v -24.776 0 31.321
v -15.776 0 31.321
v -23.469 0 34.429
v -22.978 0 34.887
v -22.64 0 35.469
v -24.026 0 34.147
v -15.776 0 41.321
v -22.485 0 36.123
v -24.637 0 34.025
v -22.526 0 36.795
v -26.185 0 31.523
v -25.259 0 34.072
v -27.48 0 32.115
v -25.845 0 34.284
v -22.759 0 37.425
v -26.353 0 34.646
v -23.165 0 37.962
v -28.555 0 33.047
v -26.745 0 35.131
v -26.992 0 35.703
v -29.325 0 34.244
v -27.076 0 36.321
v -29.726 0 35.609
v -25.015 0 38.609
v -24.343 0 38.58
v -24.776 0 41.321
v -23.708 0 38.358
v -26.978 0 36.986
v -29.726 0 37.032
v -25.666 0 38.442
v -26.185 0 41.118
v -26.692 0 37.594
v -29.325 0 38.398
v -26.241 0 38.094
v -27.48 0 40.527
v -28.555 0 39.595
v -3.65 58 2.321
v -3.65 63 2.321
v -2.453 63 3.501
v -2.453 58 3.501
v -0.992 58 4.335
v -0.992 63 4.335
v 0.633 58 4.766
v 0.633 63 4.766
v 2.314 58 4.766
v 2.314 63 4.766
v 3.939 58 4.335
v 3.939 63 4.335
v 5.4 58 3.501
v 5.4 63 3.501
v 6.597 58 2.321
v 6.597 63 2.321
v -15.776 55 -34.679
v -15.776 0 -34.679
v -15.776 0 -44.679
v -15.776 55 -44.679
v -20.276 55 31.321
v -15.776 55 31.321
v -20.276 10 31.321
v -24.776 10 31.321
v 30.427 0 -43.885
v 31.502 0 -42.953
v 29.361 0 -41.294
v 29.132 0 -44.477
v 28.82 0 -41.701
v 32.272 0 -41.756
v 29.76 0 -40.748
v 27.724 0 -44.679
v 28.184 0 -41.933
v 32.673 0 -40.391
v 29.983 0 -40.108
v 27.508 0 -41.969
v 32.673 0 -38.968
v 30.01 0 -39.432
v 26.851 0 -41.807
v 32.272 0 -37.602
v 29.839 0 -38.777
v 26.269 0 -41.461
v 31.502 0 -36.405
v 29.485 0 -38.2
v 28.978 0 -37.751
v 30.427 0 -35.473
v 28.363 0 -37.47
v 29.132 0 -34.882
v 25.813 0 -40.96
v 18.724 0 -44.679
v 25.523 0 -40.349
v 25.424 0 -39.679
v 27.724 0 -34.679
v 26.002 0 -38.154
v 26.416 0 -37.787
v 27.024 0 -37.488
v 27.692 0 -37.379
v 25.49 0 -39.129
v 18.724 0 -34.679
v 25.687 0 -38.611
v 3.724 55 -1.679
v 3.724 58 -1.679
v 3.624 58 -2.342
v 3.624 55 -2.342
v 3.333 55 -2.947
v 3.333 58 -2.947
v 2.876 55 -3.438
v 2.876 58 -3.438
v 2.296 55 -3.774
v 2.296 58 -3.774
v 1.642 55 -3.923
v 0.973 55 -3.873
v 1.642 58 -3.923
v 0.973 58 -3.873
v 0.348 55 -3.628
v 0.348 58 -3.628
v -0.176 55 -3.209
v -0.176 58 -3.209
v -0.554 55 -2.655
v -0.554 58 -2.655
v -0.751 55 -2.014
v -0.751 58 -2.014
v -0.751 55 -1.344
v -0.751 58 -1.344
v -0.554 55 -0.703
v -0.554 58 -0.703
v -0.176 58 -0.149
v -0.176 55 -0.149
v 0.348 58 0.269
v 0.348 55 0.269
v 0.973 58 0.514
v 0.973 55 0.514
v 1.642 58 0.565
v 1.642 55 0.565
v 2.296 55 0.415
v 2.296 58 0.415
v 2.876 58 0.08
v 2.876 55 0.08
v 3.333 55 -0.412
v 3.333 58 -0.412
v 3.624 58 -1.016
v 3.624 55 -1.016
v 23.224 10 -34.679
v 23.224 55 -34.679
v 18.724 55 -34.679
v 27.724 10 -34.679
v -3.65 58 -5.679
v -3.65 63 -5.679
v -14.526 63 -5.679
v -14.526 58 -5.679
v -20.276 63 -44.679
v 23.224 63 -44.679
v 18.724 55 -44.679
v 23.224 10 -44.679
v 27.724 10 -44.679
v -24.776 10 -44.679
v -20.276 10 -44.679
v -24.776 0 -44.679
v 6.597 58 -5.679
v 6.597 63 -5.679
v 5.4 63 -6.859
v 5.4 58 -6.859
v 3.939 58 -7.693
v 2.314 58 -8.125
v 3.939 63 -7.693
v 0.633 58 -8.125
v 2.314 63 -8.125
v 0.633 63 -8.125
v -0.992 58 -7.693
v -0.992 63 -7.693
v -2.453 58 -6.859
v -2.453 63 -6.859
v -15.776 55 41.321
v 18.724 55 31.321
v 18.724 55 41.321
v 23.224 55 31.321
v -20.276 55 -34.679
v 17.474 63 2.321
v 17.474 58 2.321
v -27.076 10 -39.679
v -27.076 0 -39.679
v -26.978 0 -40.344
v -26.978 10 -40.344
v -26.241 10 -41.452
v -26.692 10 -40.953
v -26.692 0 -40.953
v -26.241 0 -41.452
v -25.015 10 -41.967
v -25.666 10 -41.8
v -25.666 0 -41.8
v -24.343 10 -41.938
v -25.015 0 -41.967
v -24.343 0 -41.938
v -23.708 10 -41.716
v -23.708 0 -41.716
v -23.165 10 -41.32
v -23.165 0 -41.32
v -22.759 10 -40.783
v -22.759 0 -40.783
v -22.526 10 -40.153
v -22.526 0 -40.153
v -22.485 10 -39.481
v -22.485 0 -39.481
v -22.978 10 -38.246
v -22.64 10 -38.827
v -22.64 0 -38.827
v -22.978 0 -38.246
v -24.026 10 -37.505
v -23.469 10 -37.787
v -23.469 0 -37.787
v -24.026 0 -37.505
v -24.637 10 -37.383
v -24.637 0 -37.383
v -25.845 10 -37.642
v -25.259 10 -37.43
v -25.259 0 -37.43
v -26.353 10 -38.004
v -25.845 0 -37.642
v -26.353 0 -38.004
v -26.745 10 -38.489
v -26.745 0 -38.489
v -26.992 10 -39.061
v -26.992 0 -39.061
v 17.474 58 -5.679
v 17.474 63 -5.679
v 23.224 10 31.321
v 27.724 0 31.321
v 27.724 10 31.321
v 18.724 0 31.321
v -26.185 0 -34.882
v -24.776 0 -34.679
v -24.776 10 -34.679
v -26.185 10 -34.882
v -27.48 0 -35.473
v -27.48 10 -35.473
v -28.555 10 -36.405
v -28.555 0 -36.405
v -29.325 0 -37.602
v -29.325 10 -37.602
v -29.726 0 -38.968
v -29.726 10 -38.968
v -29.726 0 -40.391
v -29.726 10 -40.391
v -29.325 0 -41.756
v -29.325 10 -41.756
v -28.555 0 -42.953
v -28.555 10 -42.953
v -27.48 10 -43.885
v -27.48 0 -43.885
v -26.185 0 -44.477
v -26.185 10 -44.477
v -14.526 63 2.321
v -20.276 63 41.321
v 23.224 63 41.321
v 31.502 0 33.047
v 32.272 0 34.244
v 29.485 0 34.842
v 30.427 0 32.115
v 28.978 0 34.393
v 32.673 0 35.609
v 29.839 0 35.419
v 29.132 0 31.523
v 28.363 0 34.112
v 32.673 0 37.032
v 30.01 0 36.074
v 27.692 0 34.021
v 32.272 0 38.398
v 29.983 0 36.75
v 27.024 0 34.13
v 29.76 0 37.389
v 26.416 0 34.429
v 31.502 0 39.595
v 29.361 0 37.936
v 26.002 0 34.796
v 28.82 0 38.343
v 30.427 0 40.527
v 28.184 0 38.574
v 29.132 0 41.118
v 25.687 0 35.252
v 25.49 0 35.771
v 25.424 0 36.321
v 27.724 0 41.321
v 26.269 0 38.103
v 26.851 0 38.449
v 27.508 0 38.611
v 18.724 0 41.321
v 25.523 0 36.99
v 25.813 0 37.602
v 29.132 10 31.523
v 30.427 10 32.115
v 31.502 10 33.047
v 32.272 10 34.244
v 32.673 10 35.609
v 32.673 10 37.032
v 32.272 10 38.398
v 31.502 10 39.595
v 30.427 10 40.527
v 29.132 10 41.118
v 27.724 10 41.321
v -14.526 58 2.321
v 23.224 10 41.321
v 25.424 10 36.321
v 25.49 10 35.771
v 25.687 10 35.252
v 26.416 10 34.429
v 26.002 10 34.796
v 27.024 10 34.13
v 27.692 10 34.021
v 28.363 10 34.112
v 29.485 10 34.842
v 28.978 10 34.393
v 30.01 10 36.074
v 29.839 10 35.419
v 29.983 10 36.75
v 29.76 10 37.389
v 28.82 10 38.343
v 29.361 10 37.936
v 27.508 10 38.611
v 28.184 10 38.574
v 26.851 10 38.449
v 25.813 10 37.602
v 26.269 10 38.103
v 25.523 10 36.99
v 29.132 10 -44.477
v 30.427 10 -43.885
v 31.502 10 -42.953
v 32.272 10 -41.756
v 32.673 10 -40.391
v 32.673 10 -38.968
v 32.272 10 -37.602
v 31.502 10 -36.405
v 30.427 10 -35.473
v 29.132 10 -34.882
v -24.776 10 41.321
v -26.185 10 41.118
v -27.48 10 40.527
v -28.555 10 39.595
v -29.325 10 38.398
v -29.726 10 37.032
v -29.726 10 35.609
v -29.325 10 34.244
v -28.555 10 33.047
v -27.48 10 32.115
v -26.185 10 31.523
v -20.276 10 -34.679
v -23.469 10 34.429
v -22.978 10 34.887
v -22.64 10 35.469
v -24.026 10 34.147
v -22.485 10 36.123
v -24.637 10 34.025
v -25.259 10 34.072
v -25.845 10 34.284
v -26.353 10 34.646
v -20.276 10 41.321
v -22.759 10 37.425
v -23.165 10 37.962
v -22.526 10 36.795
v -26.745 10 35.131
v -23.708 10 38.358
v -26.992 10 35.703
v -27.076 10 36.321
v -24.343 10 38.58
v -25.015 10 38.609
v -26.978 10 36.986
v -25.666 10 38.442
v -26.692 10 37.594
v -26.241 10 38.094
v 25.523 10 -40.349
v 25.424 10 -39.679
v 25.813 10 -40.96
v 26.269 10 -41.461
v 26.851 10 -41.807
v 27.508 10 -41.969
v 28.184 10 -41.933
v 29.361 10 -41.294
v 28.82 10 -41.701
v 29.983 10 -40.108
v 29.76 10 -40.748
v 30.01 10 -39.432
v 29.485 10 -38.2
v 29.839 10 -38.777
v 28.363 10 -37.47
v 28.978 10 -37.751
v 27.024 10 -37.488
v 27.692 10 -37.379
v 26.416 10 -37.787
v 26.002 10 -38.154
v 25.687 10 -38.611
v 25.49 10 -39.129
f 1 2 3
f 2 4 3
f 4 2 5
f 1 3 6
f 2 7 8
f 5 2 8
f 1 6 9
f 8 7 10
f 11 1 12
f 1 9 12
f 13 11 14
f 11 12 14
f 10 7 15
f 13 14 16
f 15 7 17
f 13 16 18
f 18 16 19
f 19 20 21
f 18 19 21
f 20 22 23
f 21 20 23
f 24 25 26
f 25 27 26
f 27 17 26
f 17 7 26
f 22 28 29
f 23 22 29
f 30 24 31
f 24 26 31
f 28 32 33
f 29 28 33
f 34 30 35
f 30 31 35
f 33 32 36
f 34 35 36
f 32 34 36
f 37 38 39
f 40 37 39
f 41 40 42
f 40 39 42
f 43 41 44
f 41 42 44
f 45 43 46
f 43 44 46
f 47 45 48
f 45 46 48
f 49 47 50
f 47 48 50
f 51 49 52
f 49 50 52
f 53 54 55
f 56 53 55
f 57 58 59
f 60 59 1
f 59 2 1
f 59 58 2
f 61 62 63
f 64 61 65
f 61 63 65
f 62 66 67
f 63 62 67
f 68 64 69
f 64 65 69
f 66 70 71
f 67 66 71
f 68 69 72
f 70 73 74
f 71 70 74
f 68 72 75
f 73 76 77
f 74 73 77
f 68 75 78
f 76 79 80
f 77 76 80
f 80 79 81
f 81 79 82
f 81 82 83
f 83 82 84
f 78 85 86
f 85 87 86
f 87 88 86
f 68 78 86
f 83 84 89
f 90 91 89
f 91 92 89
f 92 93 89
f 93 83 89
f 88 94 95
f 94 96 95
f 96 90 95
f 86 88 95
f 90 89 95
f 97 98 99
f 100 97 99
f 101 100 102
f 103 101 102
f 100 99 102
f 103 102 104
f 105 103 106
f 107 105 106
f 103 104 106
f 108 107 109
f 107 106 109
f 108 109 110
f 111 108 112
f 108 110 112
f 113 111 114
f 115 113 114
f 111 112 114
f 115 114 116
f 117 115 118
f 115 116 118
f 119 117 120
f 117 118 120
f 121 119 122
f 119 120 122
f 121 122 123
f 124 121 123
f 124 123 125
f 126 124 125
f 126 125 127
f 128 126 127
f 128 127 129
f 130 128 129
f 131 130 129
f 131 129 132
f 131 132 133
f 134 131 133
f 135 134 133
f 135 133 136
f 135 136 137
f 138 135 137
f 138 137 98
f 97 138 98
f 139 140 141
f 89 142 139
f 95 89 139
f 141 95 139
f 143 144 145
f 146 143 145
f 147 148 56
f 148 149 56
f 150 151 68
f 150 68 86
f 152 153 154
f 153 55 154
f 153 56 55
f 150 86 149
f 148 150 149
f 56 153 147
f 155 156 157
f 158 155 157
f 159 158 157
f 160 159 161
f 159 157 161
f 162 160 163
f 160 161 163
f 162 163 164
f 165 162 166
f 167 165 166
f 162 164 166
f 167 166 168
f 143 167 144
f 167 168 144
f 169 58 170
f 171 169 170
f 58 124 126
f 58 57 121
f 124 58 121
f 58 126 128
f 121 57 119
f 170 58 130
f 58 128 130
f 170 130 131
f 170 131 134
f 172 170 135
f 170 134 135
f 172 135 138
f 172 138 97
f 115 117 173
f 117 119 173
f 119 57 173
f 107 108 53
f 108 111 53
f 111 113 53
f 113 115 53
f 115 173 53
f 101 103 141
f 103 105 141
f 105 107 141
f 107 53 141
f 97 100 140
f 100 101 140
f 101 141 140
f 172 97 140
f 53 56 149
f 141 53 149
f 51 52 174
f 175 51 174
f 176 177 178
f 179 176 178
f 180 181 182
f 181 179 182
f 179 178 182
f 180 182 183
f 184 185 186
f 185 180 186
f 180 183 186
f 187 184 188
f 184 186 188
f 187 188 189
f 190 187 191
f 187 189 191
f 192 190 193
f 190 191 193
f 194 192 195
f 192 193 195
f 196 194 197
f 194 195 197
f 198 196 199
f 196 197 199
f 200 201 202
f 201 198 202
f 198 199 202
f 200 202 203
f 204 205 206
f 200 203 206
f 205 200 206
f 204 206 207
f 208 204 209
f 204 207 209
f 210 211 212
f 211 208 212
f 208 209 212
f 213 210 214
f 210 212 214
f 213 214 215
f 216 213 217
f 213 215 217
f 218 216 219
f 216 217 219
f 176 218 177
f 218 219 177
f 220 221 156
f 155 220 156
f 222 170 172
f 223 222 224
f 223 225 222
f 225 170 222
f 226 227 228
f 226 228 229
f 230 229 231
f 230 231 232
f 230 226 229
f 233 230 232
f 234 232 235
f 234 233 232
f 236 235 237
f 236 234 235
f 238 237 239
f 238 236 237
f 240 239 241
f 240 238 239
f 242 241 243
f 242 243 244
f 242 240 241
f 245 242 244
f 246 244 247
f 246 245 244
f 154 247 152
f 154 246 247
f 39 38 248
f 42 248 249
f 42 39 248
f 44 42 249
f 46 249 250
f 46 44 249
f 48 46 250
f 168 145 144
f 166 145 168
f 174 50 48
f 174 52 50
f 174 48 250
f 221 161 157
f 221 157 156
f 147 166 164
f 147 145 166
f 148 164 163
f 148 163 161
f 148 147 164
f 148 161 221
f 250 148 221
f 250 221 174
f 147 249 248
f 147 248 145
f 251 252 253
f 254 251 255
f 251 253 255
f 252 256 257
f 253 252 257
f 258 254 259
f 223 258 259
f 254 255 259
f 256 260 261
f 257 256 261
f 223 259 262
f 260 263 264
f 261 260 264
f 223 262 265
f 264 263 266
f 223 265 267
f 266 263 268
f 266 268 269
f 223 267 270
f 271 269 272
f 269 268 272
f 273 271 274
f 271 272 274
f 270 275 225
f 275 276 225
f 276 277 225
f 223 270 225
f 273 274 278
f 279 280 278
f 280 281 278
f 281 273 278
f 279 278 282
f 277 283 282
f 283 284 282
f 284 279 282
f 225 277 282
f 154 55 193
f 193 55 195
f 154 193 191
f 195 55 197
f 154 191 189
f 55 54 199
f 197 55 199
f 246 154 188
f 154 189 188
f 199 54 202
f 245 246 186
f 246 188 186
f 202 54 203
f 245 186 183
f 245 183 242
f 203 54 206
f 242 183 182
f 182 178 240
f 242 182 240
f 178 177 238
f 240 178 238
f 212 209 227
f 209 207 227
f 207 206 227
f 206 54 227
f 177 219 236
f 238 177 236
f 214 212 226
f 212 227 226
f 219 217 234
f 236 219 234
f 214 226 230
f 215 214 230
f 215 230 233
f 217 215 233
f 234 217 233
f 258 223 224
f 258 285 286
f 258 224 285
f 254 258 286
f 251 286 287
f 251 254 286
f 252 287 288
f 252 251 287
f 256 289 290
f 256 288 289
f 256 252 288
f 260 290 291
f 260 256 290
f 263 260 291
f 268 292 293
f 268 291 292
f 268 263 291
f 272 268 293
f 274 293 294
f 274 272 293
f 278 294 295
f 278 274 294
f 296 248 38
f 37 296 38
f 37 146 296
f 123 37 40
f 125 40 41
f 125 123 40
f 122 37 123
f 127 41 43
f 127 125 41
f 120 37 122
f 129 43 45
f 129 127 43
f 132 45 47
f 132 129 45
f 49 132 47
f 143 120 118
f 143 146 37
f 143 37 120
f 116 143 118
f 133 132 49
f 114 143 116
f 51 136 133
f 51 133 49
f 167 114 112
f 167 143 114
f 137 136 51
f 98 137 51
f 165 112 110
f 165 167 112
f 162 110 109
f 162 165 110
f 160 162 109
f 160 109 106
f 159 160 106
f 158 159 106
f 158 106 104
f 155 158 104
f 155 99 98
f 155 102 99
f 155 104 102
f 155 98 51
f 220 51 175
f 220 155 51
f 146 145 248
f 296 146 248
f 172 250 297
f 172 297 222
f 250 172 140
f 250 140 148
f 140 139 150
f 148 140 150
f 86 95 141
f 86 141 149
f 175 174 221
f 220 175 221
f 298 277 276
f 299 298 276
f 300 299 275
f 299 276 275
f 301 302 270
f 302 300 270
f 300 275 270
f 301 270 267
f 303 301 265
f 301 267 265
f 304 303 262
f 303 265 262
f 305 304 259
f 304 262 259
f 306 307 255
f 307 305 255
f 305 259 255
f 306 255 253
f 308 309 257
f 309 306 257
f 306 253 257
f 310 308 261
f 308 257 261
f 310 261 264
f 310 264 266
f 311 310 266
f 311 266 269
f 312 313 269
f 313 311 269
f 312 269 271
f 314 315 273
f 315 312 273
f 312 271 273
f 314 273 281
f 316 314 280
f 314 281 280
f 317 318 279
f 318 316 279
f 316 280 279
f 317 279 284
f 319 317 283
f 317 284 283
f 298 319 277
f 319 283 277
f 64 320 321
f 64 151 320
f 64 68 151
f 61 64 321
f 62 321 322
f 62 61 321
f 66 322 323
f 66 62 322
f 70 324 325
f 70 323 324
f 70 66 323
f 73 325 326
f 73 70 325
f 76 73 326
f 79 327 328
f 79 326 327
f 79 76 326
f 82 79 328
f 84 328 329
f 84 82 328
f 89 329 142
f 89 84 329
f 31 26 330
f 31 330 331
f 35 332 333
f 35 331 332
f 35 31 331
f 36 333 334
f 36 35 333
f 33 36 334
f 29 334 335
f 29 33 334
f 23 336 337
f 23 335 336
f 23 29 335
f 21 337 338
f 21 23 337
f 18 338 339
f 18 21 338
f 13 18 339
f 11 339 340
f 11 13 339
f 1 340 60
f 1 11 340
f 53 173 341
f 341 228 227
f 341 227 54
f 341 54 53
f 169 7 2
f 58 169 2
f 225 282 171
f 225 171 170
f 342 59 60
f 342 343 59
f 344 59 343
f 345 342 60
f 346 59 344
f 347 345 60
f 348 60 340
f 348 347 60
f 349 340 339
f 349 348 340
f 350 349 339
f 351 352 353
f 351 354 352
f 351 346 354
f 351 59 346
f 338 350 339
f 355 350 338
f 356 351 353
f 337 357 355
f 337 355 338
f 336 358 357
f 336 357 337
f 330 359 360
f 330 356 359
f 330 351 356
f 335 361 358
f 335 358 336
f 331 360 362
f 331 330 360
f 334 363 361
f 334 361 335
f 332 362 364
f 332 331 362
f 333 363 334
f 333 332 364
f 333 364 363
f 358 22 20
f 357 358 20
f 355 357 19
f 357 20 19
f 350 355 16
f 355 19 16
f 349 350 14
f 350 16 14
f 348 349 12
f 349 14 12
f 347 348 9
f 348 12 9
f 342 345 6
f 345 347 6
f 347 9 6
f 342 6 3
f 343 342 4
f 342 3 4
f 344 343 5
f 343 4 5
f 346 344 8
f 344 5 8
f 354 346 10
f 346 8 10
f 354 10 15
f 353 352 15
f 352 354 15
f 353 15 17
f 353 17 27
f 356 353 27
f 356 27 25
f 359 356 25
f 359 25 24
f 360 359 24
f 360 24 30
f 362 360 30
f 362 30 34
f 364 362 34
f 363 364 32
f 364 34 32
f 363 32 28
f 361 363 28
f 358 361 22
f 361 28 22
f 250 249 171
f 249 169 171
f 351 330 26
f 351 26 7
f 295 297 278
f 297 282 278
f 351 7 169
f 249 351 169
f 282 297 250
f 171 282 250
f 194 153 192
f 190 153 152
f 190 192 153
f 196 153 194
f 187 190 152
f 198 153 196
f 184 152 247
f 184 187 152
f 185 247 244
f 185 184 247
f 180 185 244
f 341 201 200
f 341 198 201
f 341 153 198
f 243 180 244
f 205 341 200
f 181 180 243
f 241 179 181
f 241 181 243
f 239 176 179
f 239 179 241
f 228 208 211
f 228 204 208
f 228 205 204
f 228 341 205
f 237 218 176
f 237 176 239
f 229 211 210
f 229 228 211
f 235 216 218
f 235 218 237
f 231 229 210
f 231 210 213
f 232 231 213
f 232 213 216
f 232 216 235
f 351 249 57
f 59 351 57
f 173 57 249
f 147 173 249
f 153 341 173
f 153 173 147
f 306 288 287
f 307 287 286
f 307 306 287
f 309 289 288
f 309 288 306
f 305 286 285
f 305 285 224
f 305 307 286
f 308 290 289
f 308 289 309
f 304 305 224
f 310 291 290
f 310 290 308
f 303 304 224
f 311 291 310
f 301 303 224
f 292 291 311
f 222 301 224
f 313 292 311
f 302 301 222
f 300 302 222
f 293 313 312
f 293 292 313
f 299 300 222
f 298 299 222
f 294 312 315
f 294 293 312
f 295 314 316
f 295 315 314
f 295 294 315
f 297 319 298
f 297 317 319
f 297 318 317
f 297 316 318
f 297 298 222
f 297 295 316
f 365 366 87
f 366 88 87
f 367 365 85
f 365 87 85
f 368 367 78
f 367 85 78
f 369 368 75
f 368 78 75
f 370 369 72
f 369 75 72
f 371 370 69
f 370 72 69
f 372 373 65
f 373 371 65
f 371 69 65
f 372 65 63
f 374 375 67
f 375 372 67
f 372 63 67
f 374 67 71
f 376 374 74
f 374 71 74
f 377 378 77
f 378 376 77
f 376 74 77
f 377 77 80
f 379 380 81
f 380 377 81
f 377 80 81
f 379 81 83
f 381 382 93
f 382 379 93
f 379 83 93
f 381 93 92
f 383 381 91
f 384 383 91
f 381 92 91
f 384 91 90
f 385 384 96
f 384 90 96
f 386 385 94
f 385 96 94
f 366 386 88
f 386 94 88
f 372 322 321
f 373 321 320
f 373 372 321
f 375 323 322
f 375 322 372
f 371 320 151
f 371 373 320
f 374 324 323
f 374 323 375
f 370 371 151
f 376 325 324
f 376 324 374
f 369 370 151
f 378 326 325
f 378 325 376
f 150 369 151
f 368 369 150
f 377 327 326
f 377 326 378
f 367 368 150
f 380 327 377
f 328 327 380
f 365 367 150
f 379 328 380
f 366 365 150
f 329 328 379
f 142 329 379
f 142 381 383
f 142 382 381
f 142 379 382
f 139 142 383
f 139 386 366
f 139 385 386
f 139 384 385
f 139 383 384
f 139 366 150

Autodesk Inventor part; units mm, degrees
ref_plane "YZ Plane" through (0, 0, 0) normal (1, 0, 0) x (0, 1, 0)
ref_plane "XZ Plane" through (0, 0, 0) normal (0, 1, 0) x (-1, 0, 0)
ref_plane "XY Plane" through (0, 0, 0) normal (0, 0, 1) x (1, 0, 0)
sketch "Sketch1" plane through (0, 0, 0) normal (0, 1, 0) x (-1, 0, 0)
  circle A0 centre (-27.7235, -39.6791) radius 2.3
  line L0 (24.7765, 36.3209) -> (-27.7235, -39.6791)
  circle A1 centre (24.7765, -39.6791) radius 2.3
  circle A2 centre (-27.7235, 36.3209) radius 2.3
  line L1 (24.7765, -39.6791) -> (-27.7235, 36.3209)
  circle A3 centre (24.7765, 36.3209) radius 2.3
  circle A4 centre (24.7765, 36.3209) radius 2.3
  circle A5 centre (-27.7235, 36.3209) radius 2.3
  circle A6 centre (24.7765, -39.6791) radius 2.3
  circle A7 centre (-27.7235, -39.6791) radius 2.3
  circle A8 centre (-1.4735, -1.6791) radius 6.8323
  circle A9 centre (-27.7235, 36.3209) radius 5
  circle A10 centre (-27.7235, -39.6791) radius 5
  circle A11 centre (24.7765, -39.6791) radius 5
  circle A12 centre (24.7765, 36.3209) radius 5
  line L2 (-27.7235, 41.3209) -> (-18.7235, 41.3209)
  line L3 (-18.7235, 41.3209) -> (-18.7235, 31.3209)
  line L4 (-18.7235, 31.3209) -> (-27.7235, 31.3209)
  line L5 (24.7765, 41.3209) -> (15.7765, 41.3209)
  line L6 (15.7765, 41.3209) -> (15.7765, 31.3209)
  line L7 (15.7765, 31.3209) -> (24.7765, 31.3209)
  line L8 (24.7765, -34.6791) -> (15.7765, -34.6791)
  line L9 (15.7765, -34.6791) -> (15.7765, -44.6791)
  line L10 (15.7765, -44.6791) -> (24.7765, -44.6791)
  line L11 (-27.7235, -34.6791) -> (-18.7235, -34.6791)
  line L12 (-18.7235, -34.6791) -> (-18.7235, -44.6791)
  line L13 (-18.7235, -44.6791) -> (-27.7235, -44.6791)
  point P0 (0, 0)
  dimension "d0" = 10
  dimension "d1" = 10
  dimension "d2" = 10
  dimension "d3" = 10
  dimension "d4" = 9
  dimension "d5" = 9
extrude "Extrusion1" add sketch "Sketch1" along normal blind 10 contours A10 | A10 L11 L0 | L0 L11 L12 L13 A10 | L4 A9 L1 | L1 A9 L2 L3 L4 | L7 L6 L5 A12 L0 | L0 A12 L7 | L8 A11 L1 | L1 A11 L10 L9 L8 | A9 | A11 | A12
sketch "Sketch2" plane through (0, 10, 0) normal (0, 1, 0) x (1, 0, 0)
  line L0 (-15.7765, -41.3209) -> (-15.7765, -31.3209) projected
  line L1 (-15.7765, -31.3209) -> (-24.7765, -31.3209) projected
  line L2 (-15.7765, -41.3209) -> (-20.2765, -41.3209)
  line L3 (-20.2765, -41.3209) -> (-20.2765, -31.3209)
  line L4 (-20.2765, -31.3209) -> (-15.7765, -31.3209)
  line L5 (-15.7765, -31.3209) -> (-15.7765, -41.3209)
  line L6 (-24.7765, 34.6791) -> (-15.7765, 34.6791) projected
  line L7 (-15.7765, 44.6791) -> (-24.7765, 44.6791) projected
  line L8 (-15.7765, 34.6791) -> (-20.2765, 34.6791)
  line L9 (-20.2765, 34.6791) -> (-20.2765, 44.6791)
  line L10 (-20.2765, 44.6791) -> (-15.7765, 44.6791)
  line L11 (-15.7765, 44.6791) -> (-15.7765, 34.6791)
  line L12 (18.7235, 34.6791) -> (23.2235, 34.6791)
  line L13 (23.2235, 34.6791) -> (23.2235, 44.6791)
  line L14 (23.2235, 44.6791) -> (18.7235, 44.6791)
  line L15 (18.7235, 44.6791) -> (18.7235, 34.6791)
  line L16 (18.7235, -41.3209) -> (27.7235, -41.3209) projected
  line L17 (18.7235, -41.3209) -> (23.2235, -41.3209)
  line L18 (23.2235, -41.3209) -> (23.2235, -31.3209)
  line L19 (23.2235, -31.3209) -> (18.7235, -31.3209)
  line L20 (18.7235, -31.3209) -> (18.7235, -41.3209)
  point P0 (0, 0)
extrude "Extrusion2" add sketch "Sketch2" along normal blind 45
sketch "Sketch3" plane through (0, 55, 0) normal (0, 1, 0) x (1, 0, 0)
  line L0 (-20.2765, -41.3209) -> (-20.2765, -31.3209) projected
  line L1 (27.7235, 44.6791) -> (18.7235, 44.6791) projected
  line L2 (-20.2765, -41.3209) -> (23.2235, -41.3209)
  line L3 (23.2235, -41.3209) -> (23.2235, 44.6791)
  line L4 (23.2235, 44.6791) -> (-20.2765, 44.6791)
  line L5 (-20.2765, 44.6791) -> (-20.2765, -41.3209)
  point P0 (0, 0)
extrude "Extrusion3" add sketch "Sketch3" along normal blind 8
sketch "Sketch4" plane through (0, 63, 0) normal (0, 1, 0) x (1, 0, 0)
  line L0 (-20.2765, 44.6791) -> (-20.2765, -41.3209) projected
  line L1 (-20.2765, -41.3209) -> (23.4801, 44.6791)
  line L2 (23.2235, -41.3209) -> (23.2235, 44.6791) projected
  line L3 (23.2235, 44.6791) -> (-20.2765, 44.6791) projected
  line L4 (23.2235, -41.3209) -> (-20.2765, 44.6791)
  circle A0 centre (1.4735, 1.6791) radius 6.5
  line L5 (17.4735, 5.6791) -> (-14.5265, 5.6791)
  line L6 (-14.5265, 5.6791) -> (-14.5265, -2.3209)
  line L7 (-14.5265, -2.3209) -> (17.4735, -2.3209)
  line L8 (17.4735, -2.3209) -> (17.4735, 5.6791)
  line L9 (17.4735, 5.6791) -> (-14.5265, -2.3209) construction
  line L10 (-14.5265, 5.6791) -> (17.4735, -2.3209) construction
  point P0 (0, 0)
  point P1 (-3.65, 5.6791)
  point P2 (-3.65, -2.3209)
  point P3 (6.597, -2.3209)
  point P4 (6.597, 5.6791)
  dimension "d13" = 13
  dimension "d14" = 32
  dimension "d15" = 8
extrude "Extrusion4" cut sketch "Sketch4" against normal blind 5 contours A0 L1 L5 L4 | L4 L5 A0 | A0 L7 L1 | L1 L7 L4 A0 | L5 L1 L4 | L4 L1 L7 A0 L5 | A0 L5 L1 | A0 L7 L6 L5 | L1 L4 L7 | L4 L7 A0 | L1 L5 A0 L7 L4 | L5 L8 L7 A0
sketch "Sketch5" plane through (0, 58, 0) normal (0, 1, 0) x (1, 0, 0)
  arc A0 (6.597, 5.6791) -> (-3.65, 5.6791) centre (1.4735, 1.6791) ccw projected
  arc A1 (-3.65, -2.3209) -> (6.597, -2.3209) centre (1.4735, 1.6791) ccw projected
  circle A2 centre (1.4735, 1.6791) radius 2.25
  point P0 (0, 0)
  dimension "d18" = 4.5
extrude "Extrusion5" cut sketch "Sketch5" against normal blind 8
properties part number "ATTACHMENT_TOOLHEAD_GRIPPER"
